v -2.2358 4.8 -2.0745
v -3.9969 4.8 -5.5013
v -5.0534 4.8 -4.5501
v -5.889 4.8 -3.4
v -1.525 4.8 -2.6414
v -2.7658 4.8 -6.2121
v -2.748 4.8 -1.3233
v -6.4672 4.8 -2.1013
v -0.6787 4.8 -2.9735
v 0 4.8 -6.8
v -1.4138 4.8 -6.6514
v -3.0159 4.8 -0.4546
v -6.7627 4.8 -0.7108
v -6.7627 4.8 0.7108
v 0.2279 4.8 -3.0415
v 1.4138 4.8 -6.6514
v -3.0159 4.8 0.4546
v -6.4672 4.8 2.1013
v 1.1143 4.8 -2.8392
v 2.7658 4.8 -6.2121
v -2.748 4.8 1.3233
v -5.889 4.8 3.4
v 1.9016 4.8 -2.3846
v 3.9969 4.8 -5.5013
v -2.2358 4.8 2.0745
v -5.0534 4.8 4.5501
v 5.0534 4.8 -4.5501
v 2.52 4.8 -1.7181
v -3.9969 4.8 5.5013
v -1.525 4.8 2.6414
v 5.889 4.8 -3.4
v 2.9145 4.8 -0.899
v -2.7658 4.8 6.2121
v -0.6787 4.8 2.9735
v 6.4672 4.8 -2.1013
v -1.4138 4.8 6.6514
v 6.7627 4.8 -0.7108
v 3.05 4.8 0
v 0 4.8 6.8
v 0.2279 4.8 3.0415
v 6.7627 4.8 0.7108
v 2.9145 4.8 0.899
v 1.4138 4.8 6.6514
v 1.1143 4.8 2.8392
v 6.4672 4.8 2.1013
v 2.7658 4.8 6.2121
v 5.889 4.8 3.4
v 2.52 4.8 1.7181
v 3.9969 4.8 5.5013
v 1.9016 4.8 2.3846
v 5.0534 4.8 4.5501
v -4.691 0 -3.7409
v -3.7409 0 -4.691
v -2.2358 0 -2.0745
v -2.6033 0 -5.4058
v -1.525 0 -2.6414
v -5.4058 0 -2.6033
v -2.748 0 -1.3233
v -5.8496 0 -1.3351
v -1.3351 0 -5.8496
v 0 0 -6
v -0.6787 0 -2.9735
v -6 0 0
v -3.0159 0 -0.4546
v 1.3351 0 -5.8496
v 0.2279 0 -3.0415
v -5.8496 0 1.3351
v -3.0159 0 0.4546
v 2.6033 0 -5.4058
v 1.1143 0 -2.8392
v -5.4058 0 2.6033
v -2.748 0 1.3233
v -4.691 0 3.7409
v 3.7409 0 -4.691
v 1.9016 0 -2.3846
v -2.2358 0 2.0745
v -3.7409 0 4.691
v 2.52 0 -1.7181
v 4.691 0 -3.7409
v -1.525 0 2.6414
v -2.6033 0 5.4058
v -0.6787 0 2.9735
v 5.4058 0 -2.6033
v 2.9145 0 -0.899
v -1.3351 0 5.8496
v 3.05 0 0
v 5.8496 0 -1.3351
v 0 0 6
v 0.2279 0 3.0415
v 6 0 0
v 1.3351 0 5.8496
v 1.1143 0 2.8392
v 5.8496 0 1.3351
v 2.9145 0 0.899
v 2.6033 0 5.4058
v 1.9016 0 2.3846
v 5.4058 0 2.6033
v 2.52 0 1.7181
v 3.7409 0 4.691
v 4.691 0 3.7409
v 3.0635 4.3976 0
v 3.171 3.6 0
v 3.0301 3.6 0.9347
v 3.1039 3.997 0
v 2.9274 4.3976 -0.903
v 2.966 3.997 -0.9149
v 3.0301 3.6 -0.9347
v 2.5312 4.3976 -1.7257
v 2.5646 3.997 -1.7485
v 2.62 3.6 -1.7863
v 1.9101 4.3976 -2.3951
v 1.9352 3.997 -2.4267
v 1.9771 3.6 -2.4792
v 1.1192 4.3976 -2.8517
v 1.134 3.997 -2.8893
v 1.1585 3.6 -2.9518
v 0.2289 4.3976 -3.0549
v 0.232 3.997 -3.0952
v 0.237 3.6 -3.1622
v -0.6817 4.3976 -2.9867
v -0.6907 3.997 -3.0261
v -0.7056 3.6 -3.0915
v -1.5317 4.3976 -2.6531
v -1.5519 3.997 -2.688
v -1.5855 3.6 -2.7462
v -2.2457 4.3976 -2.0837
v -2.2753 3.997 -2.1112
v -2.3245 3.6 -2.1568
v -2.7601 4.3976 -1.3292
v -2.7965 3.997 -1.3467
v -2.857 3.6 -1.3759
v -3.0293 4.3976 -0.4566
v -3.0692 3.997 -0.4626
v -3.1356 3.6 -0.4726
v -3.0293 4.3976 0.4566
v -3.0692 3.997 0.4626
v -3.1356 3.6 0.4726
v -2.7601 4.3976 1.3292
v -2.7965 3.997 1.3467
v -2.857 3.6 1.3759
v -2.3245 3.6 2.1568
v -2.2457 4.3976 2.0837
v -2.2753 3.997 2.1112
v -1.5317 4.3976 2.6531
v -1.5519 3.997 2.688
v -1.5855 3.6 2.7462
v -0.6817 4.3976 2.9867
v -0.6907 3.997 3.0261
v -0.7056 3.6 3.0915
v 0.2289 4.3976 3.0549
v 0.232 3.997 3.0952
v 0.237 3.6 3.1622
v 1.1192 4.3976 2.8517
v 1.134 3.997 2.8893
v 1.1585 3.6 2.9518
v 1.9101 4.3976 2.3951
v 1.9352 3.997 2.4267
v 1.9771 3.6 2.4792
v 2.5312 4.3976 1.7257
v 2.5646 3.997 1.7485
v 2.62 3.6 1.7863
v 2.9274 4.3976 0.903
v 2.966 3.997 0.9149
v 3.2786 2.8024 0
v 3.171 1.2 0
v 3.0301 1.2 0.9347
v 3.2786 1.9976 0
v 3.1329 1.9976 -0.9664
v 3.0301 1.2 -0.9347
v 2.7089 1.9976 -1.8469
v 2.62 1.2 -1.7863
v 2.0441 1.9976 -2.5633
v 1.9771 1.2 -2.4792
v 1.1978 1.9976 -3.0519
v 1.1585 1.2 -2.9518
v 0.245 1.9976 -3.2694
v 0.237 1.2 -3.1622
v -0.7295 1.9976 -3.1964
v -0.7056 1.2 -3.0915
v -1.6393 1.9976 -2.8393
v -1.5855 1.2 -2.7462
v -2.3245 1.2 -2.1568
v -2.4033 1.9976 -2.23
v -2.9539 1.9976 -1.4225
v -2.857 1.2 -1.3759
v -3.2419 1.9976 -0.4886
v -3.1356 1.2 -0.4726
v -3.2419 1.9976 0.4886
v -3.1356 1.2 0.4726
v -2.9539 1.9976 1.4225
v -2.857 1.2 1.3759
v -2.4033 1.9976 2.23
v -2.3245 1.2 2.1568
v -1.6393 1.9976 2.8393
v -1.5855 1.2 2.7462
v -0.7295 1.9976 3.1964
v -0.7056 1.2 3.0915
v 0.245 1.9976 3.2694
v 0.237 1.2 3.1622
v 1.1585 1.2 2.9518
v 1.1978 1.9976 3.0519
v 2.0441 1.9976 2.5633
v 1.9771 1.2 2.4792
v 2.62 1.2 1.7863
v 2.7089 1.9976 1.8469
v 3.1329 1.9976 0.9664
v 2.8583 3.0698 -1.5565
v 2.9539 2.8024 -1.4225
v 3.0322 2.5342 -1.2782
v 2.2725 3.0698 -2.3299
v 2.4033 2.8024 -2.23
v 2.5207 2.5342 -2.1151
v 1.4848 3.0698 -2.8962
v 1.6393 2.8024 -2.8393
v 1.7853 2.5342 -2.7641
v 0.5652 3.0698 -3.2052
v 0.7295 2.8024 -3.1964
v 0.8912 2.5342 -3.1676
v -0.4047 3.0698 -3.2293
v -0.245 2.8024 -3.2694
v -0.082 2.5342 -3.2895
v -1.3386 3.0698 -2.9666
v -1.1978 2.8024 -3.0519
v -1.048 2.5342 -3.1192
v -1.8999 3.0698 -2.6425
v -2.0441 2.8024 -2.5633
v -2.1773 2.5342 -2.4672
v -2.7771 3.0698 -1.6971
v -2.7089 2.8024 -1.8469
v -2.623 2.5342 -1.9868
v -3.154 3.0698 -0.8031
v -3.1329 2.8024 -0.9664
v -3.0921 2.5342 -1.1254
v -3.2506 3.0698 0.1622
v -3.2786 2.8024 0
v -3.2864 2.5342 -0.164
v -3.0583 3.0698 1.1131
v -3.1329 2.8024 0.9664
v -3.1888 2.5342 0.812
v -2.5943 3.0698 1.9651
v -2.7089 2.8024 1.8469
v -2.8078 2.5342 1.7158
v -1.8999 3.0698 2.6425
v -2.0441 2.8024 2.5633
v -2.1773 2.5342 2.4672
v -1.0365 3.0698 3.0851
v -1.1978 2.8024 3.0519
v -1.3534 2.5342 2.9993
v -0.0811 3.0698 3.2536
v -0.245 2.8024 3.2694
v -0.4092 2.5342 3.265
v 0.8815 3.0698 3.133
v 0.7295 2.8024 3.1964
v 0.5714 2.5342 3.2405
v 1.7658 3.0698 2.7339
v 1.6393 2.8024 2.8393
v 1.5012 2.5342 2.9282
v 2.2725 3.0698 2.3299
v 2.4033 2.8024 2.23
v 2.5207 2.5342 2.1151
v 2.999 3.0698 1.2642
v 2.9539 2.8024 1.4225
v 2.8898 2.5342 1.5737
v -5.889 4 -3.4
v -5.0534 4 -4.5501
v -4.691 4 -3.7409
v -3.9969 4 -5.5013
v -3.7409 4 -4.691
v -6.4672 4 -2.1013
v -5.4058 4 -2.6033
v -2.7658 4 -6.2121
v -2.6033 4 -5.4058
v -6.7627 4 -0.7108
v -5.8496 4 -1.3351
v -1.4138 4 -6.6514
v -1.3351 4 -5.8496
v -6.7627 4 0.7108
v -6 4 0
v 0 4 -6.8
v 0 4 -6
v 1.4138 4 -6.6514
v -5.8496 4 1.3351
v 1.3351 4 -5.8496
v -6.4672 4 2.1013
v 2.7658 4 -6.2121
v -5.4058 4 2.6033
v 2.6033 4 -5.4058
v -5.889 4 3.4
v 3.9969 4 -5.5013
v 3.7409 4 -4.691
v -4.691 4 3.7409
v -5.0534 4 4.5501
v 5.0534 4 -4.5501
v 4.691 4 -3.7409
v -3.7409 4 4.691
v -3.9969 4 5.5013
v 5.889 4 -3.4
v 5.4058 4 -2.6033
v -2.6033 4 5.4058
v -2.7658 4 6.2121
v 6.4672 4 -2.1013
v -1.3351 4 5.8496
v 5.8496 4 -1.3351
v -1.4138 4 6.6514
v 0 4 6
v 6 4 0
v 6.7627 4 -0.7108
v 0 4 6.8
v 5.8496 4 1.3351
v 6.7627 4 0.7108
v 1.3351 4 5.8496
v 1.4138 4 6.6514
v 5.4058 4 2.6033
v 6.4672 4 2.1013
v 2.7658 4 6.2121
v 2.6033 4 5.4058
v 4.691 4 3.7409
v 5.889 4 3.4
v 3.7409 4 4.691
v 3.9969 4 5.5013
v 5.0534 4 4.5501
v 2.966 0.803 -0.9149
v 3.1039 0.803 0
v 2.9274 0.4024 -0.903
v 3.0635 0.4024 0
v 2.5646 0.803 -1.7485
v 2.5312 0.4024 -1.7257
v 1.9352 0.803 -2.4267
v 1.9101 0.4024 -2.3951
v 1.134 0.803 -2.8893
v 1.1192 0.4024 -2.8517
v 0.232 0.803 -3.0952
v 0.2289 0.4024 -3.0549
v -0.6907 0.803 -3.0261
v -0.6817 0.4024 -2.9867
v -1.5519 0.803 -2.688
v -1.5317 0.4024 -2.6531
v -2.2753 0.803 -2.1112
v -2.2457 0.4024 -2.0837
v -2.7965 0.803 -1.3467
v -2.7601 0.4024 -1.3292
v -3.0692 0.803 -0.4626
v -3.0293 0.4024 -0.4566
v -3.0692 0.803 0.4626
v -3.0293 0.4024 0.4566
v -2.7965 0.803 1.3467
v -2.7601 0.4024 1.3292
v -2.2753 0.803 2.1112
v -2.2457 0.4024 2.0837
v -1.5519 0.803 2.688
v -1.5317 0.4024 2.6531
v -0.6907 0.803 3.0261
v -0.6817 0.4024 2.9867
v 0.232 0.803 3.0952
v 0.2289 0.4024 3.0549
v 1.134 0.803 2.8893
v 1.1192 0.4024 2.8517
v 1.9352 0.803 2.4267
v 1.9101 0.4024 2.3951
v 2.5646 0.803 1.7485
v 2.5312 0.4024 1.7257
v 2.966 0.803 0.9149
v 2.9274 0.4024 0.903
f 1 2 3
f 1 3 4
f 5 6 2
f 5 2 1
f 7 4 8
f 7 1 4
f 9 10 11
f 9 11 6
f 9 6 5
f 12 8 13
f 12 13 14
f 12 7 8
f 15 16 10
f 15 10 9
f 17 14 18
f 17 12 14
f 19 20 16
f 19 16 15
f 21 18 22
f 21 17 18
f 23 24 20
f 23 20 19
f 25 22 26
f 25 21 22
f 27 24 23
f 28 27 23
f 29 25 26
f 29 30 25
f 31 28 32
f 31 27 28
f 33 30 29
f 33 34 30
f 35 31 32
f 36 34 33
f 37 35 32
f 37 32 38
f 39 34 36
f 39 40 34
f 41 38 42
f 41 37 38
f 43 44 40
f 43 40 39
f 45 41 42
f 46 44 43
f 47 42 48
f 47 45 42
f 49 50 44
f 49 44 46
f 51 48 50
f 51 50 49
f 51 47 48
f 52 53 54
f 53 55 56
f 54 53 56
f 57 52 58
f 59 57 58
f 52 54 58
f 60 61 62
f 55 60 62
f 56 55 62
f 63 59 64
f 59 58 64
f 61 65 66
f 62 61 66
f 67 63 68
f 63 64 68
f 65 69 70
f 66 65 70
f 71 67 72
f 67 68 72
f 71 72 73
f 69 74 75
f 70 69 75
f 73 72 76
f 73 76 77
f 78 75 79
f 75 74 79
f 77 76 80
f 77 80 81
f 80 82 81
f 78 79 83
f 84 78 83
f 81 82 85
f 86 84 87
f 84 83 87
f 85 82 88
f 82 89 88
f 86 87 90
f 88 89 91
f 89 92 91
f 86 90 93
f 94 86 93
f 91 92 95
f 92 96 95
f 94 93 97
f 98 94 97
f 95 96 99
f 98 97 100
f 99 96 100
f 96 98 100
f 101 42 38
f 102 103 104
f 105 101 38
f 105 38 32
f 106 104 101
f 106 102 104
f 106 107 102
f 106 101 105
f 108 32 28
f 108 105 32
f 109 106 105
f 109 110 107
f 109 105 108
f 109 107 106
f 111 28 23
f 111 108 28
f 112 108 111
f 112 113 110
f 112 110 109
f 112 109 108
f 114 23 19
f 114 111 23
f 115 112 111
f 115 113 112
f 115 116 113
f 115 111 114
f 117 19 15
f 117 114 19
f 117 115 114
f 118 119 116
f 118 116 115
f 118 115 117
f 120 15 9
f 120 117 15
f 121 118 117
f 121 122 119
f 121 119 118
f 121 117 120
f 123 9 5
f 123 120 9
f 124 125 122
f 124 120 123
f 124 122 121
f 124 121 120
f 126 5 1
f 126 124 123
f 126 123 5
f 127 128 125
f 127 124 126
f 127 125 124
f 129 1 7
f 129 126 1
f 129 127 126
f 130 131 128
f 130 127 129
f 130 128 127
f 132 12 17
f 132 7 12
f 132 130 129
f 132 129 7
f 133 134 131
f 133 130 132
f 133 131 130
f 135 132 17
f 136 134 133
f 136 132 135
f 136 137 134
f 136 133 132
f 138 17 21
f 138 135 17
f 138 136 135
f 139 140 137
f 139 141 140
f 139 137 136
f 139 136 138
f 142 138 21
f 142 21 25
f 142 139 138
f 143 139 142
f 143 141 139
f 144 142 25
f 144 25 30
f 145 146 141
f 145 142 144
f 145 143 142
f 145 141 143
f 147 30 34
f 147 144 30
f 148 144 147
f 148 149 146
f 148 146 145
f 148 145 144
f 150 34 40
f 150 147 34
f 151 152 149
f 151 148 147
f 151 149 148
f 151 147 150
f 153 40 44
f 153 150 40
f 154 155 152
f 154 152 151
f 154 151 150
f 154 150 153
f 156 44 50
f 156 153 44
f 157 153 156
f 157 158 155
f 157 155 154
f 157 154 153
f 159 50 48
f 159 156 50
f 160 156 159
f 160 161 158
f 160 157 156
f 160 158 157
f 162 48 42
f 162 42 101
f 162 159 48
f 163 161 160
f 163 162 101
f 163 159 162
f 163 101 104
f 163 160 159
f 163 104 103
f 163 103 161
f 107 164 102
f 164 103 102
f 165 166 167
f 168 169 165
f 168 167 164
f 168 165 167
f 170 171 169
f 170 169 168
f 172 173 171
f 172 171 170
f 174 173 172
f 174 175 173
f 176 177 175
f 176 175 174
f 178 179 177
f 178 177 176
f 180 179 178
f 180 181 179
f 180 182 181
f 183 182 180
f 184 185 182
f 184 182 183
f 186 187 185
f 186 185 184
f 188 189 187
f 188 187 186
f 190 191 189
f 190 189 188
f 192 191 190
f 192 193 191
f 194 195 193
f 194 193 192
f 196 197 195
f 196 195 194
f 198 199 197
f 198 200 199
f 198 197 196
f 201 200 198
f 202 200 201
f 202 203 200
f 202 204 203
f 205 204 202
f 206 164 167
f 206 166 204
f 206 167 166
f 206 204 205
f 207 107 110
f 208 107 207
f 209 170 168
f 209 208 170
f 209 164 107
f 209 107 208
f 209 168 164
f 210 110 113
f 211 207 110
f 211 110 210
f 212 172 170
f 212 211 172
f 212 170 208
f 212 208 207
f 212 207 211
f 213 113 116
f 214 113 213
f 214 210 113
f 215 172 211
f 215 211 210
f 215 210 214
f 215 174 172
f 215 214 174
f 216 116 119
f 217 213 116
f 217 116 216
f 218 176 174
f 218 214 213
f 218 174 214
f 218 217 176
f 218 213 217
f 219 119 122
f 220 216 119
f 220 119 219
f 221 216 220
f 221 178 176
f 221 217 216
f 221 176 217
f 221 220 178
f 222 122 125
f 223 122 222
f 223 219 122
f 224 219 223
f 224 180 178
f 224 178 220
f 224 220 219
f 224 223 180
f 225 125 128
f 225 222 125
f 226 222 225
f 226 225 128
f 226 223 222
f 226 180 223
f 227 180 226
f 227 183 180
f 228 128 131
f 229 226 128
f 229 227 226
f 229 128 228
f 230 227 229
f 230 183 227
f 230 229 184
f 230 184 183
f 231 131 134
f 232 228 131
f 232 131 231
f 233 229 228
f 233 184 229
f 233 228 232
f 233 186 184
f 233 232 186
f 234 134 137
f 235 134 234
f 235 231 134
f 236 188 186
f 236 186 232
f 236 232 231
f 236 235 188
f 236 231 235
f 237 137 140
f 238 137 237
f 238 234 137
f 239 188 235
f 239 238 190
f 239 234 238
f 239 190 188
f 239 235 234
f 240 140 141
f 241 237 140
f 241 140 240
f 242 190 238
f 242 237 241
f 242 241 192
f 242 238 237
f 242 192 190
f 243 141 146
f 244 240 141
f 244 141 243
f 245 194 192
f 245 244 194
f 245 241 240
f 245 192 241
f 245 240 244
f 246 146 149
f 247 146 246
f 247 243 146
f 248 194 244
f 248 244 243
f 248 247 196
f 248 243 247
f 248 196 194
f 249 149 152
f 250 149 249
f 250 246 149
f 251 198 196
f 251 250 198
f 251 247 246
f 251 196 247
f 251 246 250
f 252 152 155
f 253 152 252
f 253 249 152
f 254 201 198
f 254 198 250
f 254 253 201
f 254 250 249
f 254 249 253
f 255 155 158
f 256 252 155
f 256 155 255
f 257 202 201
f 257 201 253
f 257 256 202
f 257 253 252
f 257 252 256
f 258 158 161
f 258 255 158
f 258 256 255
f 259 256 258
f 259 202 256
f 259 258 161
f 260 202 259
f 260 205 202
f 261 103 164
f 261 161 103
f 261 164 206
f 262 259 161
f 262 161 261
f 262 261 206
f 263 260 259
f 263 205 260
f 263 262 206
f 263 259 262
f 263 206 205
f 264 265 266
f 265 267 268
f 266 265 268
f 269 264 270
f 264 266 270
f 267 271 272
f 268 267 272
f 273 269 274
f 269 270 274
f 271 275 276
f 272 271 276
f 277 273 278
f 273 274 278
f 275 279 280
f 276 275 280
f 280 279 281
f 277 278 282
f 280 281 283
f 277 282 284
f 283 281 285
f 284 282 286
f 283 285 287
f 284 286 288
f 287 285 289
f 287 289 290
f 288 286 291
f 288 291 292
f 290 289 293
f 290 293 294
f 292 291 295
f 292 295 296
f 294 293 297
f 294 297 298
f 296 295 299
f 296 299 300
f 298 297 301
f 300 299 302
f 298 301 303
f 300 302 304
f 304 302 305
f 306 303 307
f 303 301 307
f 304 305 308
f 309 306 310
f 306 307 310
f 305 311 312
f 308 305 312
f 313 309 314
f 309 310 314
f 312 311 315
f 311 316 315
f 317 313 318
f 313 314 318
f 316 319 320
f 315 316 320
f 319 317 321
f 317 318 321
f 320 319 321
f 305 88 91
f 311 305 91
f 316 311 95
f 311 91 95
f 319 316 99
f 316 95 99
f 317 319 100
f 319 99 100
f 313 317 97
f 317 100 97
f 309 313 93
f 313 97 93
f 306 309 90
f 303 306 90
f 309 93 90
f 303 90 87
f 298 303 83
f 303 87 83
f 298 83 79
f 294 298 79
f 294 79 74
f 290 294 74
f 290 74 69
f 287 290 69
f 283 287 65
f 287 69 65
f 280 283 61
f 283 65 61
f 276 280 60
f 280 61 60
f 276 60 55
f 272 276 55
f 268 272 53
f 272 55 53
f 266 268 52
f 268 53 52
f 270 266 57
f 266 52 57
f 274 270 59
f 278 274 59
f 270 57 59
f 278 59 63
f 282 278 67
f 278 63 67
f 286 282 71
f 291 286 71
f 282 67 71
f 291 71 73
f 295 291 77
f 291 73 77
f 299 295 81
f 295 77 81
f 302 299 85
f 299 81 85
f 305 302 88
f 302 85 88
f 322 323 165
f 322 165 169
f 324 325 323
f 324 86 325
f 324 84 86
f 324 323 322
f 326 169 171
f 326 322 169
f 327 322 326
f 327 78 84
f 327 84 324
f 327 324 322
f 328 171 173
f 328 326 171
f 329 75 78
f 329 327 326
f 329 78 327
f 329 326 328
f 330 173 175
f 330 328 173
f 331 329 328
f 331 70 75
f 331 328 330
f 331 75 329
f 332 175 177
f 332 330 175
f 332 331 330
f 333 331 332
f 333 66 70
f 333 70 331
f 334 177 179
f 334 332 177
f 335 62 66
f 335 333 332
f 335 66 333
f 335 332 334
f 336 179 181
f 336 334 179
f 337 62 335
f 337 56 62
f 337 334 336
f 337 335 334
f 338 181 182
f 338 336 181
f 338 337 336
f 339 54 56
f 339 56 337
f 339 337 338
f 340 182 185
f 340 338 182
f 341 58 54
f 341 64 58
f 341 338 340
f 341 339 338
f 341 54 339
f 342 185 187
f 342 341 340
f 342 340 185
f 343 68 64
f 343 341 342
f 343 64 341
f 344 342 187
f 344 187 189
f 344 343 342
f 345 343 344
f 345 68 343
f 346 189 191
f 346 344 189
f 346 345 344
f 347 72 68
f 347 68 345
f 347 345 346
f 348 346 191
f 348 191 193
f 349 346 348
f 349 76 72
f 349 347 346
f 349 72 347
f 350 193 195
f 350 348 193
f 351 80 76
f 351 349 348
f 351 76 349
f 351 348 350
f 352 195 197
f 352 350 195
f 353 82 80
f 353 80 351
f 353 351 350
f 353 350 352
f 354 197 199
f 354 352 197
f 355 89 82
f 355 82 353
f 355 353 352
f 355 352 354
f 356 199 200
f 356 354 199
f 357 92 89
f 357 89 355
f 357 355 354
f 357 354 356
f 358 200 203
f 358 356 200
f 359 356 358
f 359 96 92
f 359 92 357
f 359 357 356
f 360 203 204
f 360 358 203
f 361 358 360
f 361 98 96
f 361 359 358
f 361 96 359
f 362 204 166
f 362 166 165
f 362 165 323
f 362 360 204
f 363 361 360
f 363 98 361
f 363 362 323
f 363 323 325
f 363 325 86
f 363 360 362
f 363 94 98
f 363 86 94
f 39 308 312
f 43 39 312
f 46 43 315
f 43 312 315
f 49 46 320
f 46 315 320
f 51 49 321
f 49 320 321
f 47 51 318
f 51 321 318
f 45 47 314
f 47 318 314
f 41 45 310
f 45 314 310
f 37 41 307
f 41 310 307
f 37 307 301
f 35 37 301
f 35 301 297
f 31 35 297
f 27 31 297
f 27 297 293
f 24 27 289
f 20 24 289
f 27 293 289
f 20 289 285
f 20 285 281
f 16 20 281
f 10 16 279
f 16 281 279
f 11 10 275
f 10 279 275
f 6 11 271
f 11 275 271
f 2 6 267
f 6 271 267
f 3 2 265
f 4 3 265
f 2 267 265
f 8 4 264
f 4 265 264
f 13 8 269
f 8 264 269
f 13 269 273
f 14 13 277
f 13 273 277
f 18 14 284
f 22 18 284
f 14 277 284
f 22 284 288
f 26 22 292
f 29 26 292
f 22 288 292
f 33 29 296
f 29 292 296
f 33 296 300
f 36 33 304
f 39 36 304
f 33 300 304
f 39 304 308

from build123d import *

# Parameters (mm, degrees)
SKETCH1_R           = 6
SKETCH1_R_2         = 3.05
BOSS_EXTRUDE1_DEPTH = 4
SKETCH2_R           = 6.8
SKETCH2_R_2         = 3.05
BOSS_EXTRUDE2_DEPTH = 0.8


with BuildPart() as part:
    # Sketch1 → Boss-Extrude1 (new body)
    with BuildSketch(Plane(origin=(0, 0, 0), x_dir=(1, 0, 0), z_dir=(0, 1, 0))):
        with Locations(Location((0, 0, 0), (0, 0, 270))):
            Circle(SKETCH1_R)
        with Locations(Location((0, 0, 0), (0, 0, 270))):
            Circle(SKETCH1_R_2, mode=Mode.SUBTRACT)
    extrude(amount=BOSS_EXTRUDE1_DEPTH)

    # Sketch2 → Boss-Extrude2 (add)
    with BuildSketch(Plane(origin=(0, 4, 0), x_dir=(1, 0, 0), z_dir=(0, 1, 0))):
        with Locations(Location((0, 0, 0), (0, 0, 270))):
            Circle(SKETCH2_R)
        with Locations(Location((0, 0, 0), (0, 0, 270))):
            Circle(SKETCH2_R_2, mode=Mode.SUBTRACT)
    extrude(amount=BOSS_EXTRUDE2_DEPTH)

    # Sketch3 → Cut-Revolve1 (revolve, cut)
    with BuildSketch(Plane.XY, mode=Mode.PRIVATE) as cut_revolve1_sk:
        with BuildLine():
            Line((-3.05, 0), (-3.05, 4.8))
            ThreePointArc((-3.05, 4.8), (-3.080331229, 4.196956564), (-3.171018764, 3.6))
            ThreePointArc((-3.171018764, 3.6), (-3.292037528, 2.4), (-3.171018764, 1.2))
            ThreePointArc((-3.171018764, 1.2), (-3.080331229, 0.603043436), (-3.05, 0))
        make_face()
    revolve(cut_revolve1_sk.sketch.rotate(Axis((0, 0, 0), (0, 1, 0)), 180), axis=Axis((0, 0, 0), (0, 1, 0)), mode=Mode.SUBTRACT)


solid = part.part
